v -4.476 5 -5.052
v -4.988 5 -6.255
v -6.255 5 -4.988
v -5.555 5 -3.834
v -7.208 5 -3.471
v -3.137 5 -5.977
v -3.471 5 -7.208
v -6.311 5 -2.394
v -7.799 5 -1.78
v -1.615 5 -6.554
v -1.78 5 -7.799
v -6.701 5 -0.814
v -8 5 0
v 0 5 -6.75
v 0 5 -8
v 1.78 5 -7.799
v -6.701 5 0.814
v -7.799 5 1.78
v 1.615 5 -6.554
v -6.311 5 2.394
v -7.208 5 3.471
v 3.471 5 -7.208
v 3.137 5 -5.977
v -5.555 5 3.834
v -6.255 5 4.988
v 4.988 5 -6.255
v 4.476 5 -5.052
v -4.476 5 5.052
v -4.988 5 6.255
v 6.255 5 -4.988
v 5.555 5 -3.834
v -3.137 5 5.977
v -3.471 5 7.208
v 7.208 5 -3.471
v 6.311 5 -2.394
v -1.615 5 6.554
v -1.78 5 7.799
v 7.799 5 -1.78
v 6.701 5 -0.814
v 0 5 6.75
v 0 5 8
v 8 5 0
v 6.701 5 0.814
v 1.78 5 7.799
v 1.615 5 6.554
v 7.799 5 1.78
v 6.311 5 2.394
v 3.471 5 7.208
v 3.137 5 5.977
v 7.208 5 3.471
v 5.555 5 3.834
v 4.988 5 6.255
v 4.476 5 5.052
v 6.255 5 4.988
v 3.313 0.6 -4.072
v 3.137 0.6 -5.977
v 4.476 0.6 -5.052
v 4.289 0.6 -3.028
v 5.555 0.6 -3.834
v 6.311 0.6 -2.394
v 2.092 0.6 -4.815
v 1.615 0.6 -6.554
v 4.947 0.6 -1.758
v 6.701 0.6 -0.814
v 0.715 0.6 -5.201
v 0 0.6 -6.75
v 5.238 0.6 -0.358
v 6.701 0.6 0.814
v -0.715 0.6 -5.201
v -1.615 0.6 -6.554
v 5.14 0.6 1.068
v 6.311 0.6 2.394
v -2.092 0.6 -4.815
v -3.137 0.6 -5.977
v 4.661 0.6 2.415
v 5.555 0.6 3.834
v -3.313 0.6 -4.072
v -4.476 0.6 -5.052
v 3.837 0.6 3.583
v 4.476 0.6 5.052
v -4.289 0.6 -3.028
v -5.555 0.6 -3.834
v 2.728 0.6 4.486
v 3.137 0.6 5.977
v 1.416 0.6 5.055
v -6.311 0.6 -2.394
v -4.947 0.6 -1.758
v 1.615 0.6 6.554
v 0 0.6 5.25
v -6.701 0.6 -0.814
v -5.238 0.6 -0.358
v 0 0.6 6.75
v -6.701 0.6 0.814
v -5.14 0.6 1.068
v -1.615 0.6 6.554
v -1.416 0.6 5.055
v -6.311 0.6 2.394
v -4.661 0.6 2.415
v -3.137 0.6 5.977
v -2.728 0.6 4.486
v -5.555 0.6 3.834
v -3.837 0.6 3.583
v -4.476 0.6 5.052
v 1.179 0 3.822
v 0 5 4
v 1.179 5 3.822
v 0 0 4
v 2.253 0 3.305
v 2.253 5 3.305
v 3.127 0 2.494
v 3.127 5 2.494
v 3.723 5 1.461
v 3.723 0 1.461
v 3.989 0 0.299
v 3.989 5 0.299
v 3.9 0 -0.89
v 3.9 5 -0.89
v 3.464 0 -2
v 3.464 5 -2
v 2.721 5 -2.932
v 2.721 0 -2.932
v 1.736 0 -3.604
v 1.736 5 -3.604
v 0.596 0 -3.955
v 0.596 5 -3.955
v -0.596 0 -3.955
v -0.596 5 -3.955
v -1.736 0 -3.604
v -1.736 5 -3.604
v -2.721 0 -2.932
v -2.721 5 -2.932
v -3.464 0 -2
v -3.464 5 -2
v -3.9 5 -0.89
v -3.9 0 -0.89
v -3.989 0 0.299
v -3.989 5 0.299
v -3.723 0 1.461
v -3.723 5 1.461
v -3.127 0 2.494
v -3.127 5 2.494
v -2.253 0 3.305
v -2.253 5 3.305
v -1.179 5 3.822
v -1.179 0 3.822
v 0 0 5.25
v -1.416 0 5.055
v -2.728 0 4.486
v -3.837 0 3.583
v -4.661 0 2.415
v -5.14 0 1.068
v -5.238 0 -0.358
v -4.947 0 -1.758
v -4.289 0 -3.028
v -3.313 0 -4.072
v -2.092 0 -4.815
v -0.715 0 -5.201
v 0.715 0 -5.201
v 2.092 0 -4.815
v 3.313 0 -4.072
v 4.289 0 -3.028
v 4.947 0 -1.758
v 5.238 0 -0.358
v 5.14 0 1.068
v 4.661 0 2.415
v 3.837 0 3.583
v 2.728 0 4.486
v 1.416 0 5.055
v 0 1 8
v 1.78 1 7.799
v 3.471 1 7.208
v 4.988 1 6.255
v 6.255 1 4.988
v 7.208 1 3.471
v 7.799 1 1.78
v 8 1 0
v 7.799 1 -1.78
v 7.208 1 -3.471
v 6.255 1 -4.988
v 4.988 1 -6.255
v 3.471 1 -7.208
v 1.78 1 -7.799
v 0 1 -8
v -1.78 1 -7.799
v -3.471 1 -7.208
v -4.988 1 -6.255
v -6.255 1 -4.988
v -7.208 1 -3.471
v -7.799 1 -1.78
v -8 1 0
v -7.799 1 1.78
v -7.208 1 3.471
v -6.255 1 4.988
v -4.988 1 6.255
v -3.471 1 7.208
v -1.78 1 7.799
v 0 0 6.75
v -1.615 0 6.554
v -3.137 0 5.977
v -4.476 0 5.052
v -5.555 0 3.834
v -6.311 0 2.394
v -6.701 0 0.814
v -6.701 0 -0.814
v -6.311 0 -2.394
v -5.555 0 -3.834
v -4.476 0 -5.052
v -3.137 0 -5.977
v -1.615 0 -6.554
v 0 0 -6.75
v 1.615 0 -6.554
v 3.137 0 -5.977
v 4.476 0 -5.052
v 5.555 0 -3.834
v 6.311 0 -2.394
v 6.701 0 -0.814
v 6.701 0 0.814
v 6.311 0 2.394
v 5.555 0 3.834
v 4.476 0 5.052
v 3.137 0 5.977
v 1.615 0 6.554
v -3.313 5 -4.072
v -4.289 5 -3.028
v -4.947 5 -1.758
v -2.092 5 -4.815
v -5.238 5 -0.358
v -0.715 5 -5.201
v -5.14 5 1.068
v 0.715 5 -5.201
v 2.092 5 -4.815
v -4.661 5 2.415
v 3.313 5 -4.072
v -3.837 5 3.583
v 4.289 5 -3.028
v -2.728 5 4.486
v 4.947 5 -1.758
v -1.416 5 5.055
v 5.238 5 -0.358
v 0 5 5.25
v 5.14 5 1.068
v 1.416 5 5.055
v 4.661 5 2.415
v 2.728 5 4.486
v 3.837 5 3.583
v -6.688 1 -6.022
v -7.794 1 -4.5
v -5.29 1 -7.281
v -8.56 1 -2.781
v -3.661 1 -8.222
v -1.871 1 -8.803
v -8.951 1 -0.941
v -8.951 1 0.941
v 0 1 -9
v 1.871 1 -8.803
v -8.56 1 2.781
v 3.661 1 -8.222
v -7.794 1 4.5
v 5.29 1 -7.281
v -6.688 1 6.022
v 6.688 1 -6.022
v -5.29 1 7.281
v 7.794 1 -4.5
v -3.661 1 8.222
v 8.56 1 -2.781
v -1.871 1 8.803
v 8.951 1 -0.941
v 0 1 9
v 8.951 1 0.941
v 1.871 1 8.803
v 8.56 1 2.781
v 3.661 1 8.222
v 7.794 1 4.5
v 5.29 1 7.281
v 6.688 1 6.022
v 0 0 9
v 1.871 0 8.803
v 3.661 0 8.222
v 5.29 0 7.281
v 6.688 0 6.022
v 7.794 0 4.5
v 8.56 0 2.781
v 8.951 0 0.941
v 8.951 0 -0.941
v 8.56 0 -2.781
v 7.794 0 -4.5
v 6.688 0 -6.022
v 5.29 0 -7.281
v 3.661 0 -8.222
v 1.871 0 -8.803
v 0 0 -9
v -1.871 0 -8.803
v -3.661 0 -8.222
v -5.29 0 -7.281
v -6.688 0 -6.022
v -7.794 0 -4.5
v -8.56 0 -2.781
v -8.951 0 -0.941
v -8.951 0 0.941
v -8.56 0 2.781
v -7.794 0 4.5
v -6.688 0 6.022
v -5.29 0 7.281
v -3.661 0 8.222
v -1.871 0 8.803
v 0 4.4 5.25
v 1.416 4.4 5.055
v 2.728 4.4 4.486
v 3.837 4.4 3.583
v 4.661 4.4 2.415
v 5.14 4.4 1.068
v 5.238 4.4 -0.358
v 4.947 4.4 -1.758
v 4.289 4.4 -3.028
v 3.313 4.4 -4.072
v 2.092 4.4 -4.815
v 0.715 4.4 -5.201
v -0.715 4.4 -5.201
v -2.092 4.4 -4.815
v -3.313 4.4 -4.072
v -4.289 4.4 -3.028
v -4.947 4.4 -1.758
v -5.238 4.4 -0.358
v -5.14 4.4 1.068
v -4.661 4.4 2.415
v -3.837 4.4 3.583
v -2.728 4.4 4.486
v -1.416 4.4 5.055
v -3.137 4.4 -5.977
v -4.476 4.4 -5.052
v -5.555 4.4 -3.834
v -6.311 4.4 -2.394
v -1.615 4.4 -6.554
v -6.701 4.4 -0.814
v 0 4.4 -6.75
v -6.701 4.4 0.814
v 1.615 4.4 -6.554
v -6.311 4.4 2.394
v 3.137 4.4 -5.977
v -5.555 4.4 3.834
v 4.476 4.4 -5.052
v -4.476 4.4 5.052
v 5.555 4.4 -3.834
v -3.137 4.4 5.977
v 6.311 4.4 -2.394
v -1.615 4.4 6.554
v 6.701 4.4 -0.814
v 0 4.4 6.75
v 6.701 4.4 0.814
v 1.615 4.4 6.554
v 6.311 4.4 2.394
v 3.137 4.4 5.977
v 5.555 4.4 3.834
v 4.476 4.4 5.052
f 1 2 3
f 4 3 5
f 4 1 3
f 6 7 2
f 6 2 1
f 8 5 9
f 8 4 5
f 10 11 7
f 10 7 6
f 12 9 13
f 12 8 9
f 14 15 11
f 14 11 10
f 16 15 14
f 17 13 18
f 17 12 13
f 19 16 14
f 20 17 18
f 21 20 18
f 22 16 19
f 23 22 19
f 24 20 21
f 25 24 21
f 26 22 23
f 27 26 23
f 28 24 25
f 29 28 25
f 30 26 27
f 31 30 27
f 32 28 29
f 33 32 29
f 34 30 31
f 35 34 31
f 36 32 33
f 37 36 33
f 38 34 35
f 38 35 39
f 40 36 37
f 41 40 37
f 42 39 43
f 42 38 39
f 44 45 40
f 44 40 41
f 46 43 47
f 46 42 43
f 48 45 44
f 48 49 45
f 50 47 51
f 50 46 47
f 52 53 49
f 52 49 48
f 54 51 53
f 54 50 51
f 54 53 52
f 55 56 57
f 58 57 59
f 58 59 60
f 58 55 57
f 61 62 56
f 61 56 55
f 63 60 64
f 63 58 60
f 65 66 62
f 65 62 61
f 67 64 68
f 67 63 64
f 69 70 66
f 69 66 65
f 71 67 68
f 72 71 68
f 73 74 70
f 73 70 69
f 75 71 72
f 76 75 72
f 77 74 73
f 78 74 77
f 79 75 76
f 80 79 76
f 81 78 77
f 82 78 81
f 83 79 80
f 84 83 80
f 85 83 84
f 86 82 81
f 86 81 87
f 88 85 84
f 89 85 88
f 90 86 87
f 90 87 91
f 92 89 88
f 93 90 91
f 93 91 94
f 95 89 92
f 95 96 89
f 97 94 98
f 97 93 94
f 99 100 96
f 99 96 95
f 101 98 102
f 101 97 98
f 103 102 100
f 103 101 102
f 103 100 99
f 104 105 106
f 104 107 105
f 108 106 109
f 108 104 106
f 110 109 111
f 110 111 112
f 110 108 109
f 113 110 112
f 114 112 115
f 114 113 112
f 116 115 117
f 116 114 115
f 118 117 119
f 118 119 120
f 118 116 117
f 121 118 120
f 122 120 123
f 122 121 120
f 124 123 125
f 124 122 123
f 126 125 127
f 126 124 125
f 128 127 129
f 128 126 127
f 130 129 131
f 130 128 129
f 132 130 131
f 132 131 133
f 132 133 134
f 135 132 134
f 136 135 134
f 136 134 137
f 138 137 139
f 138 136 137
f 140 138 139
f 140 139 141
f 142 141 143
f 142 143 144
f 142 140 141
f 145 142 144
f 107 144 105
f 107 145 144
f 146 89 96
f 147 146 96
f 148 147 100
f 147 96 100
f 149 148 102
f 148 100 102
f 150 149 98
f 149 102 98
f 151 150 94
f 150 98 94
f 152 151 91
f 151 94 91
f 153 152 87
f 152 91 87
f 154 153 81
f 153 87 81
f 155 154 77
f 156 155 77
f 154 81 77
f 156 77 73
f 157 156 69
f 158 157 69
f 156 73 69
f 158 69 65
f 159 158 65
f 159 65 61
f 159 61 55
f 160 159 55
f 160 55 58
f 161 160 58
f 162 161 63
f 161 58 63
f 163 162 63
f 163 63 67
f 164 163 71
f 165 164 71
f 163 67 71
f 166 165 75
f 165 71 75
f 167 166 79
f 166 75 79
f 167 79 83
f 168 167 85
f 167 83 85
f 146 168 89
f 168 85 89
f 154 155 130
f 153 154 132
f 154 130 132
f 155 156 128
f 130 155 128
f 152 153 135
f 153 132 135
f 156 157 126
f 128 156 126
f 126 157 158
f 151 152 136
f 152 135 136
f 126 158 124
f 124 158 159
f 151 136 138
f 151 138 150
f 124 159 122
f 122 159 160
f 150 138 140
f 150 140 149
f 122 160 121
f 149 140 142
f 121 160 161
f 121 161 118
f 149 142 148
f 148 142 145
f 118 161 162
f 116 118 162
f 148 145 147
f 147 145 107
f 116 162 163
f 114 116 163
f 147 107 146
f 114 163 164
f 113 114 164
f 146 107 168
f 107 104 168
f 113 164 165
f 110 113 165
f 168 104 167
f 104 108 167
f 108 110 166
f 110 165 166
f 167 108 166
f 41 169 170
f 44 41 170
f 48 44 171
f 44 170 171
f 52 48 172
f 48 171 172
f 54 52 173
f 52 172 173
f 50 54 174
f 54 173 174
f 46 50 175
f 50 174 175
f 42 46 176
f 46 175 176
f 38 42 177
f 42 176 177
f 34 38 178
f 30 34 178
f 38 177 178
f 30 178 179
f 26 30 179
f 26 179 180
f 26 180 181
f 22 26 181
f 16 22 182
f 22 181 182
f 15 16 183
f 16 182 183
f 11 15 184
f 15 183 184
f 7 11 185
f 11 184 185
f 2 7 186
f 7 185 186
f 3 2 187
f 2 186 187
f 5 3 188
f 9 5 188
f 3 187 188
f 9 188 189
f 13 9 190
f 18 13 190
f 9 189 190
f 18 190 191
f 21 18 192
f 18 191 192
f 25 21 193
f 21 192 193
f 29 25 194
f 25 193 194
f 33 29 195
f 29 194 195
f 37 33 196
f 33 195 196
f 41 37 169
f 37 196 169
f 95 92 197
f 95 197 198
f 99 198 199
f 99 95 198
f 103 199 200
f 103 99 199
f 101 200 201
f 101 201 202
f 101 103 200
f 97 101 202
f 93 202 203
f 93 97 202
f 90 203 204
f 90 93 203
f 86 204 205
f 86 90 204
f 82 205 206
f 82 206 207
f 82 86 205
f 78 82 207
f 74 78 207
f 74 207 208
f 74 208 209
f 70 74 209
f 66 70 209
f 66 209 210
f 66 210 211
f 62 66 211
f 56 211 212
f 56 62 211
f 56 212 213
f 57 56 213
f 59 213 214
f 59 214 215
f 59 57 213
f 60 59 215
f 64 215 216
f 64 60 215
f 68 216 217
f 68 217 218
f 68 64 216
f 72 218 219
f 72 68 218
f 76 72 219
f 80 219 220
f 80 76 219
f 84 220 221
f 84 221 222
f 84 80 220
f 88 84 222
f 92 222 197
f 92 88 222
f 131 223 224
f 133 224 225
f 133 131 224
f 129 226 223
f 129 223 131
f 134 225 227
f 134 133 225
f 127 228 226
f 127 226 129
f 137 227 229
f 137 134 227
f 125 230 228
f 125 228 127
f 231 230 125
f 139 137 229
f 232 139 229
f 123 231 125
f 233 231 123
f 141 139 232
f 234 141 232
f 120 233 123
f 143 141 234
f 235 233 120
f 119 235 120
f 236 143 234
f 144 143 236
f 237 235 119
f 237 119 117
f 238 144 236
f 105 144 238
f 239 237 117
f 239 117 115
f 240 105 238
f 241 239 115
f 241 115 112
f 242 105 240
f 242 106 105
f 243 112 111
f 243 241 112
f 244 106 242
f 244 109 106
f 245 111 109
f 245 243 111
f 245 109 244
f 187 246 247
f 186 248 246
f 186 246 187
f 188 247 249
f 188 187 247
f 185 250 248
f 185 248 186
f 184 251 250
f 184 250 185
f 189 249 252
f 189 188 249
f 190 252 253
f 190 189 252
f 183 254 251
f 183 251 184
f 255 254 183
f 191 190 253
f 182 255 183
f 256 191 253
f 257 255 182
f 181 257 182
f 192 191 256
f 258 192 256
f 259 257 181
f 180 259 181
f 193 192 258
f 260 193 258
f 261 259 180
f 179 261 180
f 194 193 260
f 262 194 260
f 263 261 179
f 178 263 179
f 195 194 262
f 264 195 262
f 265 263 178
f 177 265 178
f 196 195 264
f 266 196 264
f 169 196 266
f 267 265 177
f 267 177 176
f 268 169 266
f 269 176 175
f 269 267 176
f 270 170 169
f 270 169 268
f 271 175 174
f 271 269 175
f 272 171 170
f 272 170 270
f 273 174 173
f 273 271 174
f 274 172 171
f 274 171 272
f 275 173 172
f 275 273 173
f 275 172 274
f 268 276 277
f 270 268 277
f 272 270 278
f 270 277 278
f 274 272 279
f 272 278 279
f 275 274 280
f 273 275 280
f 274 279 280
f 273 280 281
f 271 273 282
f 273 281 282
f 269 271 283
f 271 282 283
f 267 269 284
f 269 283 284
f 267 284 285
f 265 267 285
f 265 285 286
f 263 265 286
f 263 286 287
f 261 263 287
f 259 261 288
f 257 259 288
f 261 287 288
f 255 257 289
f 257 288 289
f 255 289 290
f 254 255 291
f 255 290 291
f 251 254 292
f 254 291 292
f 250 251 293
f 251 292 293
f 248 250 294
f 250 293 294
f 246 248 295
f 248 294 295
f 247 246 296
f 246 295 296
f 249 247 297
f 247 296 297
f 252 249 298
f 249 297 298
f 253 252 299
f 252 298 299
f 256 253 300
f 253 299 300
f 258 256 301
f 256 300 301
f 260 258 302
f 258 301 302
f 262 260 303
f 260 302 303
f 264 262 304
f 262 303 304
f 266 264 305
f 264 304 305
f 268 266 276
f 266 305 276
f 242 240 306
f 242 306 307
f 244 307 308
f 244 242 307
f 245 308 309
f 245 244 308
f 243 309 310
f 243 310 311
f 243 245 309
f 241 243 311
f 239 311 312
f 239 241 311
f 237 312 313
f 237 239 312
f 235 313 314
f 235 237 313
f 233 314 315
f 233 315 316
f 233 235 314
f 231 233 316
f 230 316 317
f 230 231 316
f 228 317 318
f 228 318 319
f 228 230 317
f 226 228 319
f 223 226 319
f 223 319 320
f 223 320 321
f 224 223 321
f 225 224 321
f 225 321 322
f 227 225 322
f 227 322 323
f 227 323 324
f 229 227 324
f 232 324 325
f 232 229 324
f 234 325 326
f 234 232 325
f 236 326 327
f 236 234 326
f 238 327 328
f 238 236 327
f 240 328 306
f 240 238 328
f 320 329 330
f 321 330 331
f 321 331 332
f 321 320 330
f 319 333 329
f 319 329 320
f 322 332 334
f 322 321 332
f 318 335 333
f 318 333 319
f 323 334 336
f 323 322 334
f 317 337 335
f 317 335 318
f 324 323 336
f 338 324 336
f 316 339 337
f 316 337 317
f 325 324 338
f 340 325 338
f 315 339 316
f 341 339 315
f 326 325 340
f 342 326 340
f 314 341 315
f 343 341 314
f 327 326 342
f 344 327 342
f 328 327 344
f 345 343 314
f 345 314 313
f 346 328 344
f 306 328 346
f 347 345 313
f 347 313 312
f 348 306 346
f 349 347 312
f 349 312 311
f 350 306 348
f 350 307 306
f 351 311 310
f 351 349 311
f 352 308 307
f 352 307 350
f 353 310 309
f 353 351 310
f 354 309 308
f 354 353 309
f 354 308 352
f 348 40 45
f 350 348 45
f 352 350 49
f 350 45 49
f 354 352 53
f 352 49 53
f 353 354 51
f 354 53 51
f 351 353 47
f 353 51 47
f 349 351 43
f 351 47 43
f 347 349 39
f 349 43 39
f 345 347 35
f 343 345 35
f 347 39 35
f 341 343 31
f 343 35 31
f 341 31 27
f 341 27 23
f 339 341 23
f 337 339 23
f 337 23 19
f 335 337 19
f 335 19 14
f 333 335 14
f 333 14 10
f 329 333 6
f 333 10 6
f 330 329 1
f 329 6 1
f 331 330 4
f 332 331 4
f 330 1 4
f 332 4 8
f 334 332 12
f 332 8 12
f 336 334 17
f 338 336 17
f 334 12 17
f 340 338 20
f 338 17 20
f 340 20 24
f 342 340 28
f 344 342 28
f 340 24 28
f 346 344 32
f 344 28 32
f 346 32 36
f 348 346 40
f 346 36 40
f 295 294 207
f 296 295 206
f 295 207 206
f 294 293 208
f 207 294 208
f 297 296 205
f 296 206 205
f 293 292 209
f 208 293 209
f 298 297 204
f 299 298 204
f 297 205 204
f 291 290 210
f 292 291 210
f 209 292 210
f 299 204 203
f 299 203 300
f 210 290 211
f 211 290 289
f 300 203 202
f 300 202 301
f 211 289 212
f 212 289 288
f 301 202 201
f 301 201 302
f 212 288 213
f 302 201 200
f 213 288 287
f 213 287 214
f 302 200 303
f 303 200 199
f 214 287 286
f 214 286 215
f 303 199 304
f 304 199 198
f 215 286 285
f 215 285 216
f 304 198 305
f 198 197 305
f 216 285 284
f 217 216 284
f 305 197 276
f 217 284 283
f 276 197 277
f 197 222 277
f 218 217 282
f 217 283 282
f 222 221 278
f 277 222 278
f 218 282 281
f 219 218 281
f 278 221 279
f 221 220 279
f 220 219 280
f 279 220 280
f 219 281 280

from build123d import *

# Parameters (mm, degrees)
SKETCH1_R           = 9
SKETCH1_R_2         = 4
BOSS_EXTRUDE1_DEPTH = 1
SKETCH2_R           = 8
SKETCH2_R_2         = 4
BOSS_EXTRUDE2_DEPTH = 4
SKETCH3_R           = 6.75
SKETCH3_R_2         = 5.25
CUT_EXTRUDE1_DEPTH  = 0.6
CUT_EXTRUDE2_START  = -0.6
SKETCH4_R           = 6.75
SKETCH4_R_2         = 5.25
CUT_EXTRUDE2_DEPTH  = 0.6


with BuildPart() as part:
    # Sketch1 → Boss-Extrude1 (new body)
    with BuildSketch(Plane(origin=(0, 0, 0), x_dir=(1, 0, 0), z_dir=(0, 1, 0))):
        with Locations(Location((0, 0, 0), (0, 0, 270))):
            Circle(SKETCH1_R)
        with Locations(Location((0, 0, 0), (0, 0, 270))):
            Circle(SKETCH1_R_2, mode=Mode.SUBTRACT)
    extrude(amount=BOSS_EXTRUDE1_DEPTH)

    # Sketch2 → Boss-Extrude2 (add)
    with BuildSketch(Plane(origin=(0, 1, 0), x_dir=(1, 0, 0), z_dir=(0, 1, 0))):
        with Locations(Location((0, 0, 0), (0, 0, 270))):
            Circle(SKETCH2_R)
        with Locations(Location((0, 0, 0), (0, 0, 270))):
            Circle(SKETCH2_R_2, mode=Mode.SUBTRACT)
    extrude(amount=BOSS_EXTRUDE2_DEPTH)

    # Sketch3 → Cut-Extrude1 (cut)
    with BuildSketch(Plane(origin=(0, 5, 0), x_dir=(1, 0, 0), z_dir=(0, 1, 0))):
        with Locations(Location((0, 0, 0), (0, 0, 270))):
            Circle(SKETCH3_R)
        with Locations(Location((0, 0, 0), (0, 0, 270))):
            Circle(SKETCH3_R_2, mode=Mode.SUBTRACT)
    extrude(amount=-CUT_EXTRUDE1_DEPTH, mode=Mode.SUBTRACT)

    # Sketch4 → Cut-Extrude2 (cut)
    with BuildSketch(Plane(origin=(0, 0, 0), x_dir=(-1, 0, 0), z_dir=(0, -1, 0)).offset(CUT_EXTRUDE2_START)):
        with Locations(Location((0, 0, 0), (0, 0, 270))):
            Circle(SKETCH4_R)
        with Locations(Location((0, 0, 0), (0, 0, 270))):
            Circle(SKETCH4_R_2, mode=Mode.SUBTRACT)
    extrude(amount=CUT_EXTRUDE2_DEPTH, mode=Mode.SUBTRACT)


solid = part.part
